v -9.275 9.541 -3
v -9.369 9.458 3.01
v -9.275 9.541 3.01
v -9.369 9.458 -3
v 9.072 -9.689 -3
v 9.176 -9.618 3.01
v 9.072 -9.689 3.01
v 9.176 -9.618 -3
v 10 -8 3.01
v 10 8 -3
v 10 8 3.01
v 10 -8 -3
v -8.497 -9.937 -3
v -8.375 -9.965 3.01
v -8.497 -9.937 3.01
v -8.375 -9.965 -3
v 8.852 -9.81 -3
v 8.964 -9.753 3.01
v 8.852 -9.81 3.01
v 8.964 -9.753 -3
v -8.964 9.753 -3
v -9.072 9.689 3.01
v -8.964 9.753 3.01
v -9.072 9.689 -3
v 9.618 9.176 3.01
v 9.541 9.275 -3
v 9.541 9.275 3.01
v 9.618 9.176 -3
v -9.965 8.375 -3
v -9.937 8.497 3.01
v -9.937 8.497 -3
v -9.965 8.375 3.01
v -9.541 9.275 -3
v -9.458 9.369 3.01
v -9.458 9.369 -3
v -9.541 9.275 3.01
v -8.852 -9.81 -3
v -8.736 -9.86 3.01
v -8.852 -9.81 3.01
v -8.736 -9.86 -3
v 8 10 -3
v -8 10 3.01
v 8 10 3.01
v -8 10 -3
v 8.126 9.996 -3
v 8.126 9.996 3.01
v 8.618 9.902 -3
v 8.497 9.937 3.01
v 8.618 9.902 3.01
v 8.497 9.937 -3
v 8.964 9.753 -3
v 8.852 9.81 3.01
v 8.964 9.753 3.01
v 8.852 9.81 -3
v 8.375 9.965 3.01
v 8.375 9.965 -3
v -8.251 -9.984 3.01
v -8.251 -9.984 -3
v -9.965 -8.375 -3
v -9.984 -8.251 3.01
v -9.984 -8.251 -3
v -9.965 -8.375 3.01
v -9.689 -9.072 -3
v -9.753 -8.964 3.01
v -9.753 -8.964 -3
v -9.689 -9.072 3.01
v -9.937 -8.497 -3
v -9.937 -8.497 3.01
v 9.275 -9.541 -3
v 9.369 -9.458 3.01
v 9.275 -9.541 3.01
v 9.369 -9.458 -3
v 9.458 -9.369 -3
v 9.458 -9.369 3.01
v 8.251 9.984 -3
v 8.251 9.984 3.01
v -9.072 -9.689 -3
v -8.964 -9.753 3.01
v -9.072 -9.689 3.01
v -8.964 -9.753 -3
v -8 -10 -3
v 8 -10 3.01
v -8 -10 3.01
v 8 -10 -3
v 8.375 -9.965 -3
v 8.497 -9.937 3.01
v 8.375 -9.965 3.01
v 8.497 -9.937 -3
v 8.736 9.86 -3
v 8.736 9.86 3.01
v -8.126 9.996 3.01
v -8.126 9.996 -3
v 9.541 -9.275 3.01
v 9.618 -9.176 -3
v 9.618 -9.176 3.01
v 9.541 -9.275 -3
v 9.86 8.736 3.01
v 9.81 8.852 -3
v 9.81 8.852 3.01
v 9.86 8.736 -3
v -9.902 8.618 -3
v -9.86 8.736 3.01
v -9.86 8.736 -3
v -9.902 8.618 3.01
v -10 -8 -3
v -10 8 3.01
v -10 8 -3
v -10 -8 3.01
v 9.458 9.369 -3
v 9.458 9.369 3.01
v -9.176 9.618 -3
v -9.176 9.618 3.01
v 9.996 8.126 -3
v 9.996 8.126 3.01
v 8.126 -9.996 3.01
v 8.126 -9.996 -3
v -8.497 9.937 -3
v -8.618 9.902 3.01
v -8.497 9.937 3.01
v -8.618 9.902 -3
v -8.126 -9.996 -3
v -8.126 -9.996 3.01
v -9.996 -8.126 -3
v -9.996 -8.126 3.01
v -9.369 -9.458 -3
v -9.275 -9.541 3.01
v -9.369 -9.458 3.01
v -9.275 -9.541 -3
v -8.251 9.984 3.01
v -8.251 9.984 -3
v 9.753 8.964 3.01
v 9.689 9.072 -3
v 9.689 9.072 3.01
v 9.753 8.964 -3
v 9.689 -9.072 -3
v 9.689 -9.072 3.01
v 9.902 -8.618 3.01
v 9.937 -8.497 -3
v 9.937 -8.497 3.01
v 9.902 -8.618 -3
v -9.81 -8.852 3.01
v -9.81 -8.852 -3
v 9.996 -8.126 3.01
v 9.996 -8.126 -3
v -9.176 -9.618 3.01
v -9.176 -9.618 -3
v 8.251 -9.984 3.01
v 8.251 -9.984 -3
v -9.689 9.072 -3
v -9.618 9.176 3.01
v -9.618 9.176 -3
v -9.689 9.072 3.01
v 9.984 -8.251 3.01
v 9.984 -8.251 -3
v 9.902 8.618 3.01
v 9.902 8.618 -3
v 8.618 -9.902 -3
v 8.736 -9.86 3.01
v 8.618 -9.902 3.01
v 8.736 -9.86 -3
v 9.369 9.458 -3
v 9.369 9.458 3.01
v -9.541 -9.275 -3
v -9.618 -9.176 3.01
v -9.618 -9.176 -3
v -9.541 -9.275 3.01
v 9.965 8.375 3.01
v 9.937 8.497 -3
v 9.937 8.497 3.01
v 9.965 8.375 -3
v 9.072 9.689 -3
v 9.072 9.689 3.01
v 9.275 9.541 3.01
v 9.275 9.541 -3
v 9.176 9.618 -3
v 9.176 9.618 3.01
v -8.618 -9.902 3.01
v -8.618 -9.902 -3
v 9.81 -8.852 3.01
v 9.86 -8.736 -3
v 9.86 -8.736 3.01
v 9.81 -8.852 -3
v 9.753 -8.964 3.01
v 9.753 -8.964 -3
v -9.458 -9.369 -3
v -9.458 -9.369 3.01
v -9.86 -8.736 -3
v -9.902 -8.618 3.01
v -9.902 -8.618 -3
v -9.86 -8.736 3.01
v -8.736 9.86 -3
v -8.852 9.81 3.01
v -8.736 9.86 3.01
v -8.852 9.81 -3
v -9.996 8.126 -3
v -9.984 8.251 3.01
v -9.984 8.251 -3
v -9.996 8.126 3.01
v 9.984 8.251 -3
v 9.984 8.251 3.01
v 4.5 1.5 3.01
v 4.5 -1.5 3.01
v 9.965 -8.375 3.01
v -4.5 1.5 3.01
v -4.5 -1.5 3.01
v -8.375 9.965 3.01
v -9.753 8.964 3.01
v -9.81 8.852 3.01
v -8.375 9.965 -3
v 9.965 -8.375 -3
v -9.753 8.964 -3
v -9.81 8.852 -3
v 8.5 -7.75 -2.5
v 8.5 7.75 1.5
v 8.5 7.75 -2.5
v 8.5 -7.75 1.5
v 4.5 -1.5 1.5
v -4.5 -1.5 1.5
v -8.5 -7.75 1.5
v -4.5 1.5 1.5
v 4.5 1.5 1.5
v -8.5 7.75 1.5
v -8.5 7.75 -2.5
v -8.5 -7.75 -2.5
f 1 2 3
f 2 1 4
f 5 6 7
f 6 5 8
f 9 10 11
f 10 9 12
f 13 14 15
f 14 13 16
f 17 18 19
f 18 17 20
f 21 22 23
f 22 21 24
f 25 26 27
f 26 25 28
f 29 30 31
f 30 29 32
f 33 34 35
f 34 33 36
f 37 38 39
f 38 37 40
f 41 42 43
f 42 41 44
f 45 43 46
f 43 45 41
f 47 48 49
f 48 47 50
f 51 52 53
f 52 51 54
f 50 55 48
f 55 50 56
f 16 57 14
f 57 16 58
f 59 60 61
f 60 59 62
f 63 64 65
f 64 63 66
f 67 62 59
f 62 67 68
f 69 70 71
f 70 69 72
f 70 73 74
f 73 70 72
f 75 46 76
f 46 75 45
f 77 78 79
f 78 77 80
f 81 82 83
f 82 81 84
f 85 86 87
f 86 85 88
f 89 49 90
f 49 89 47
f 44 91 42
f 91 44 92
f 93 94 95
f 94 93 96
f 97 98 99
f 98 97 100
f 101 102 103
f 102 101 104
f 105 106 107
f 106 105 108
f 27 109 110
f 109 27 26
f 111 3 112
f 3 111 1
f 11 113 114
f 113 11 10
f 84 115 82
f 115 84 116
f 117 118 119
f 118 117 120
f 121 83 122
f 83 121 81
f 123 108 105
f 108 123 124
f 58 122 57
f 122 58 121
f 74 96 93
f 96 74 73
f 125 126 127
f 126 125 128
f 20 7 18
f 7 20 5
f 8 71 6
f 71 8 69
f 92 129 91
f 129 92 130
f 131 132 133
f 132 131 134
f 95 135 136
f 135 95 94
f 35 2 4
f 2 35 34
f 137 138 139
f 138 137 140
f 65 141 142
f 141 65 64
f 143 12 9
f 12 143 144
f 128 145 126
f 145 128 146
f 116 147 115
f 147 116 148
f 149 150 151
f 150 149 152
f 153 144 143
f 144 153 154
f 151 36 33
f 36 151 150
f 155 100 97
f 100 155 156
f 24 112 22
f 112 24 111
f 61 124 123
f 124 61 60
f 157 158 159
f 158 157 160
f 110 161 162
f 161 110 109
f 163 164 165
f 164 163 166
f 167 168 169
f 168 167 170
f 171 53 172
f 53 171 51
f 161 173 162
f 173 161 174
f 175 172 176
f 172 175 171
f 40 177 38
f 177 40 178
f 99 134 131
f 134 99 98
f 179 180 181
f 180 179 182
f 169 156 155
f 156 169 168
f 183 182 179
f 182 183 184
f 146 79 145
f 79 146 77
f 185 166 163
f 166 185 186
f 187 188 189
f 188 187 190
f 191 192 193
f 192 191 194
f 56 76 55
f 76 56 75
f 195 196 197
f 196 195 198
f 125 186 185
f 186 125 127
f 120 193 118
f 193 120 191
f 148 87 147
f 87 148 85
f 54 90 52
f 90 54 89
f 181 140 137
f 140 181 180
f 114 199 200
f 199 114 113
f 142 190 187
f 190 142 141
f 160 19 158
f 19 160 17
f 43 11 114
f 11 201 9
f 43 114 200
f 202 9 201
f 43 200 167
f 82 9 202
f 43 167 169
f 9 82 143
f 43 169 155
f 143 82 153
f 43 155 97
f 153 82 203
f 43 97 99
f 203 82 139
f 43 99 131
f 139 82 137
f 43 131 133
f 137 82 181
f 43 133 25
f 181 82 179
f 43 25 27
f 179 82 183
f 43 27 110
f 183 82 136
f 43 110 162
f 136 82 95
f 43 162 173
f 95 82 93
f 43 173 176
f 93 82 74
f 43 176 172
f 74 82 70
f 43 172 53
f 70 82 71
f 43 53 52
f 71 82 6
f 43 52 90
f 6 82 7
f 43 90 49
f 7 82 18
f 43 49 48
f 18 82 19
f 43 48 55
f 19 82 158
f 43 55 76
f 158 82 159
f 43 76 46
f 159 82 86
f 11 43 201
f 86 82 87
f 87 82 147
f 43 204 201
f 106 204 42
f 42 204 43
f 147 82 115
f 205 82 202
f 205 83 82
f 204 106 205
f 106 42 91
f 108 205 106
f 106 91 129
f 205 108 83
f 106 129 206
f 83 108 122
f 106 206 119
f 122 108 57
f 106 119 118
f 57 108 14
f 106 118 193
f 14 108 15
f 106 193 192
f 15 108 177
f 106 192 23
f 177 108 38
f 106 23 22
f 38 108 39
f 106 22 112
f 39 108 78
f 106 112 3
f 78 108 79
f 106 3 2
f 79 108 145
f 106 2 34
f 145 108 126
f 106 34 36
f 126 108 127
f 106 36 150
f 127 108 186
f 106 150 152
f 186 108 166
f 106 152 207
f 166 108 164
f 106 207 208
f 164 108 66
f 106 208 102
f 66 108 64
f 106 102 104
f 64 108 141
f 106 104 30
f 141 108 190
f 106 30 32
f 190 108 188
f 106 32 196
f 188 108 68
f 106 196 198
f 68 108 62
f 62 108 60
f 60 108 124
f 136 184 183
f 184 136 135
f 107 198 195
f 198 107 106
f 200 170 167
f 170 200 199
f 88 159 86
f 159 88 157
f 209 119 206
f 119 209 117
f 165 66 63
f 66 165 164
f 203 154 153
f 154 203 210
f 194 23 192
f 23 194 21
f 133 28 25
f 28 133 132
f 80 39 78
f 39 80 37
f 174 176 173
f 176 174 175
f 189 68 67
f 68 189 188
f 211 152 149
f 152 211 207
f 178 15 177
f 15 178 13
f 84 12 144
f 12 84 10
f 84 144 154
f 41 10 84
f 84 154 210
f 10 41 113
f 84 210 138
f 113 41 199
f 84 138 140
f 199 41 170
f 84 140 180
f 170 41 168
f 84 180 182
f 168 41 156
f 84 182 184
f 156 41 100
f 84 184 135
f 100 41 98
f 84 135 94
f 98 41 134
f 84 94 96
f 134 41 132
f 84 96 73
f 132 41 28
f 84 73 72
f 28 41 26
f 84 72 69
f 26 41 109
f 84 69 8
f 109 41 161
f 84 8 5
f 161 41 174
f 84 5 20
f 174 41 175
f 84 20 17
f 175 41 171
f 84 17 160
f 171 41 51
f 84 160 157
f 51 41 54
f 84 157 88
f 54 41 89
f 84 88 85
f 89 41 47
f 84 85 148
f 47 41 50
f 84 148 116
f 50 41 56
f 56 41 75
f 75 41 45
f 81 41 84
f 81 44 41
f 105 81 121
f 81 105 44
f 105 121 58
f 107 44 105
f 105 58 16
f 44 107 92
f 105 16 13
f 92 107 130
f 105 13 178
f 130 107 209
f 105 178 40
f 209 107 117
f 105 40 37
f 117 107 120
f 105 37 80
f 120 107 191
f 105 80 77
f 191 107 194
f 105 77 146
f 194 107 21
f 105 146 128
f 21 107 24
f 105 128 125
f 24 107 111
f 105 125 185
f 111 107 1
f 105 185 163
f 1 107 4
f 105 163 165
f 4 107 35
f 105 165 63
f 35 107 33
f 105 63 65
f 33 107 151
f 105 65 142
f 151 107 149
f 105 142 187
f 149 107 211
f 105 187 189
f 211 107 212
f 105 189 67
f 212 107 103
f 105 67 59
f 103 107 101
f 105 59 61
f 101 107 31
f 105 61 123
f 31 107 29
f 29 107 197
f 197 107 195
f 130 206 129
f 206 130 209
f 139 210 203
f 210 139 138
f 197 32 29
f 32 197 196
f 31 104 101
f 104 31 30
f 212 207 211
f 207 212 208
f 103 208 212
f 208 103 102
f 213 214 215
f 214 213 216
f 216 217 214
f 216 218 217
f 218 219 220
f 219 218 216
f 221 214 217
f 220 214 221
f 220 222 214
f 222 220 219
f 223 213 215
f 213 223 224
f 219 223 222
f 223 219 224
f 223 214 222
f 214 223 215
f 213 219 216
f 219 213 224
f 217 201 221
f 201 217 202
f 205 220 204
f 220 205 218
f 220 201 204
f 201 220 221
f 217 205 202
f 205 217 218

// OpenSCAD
difference() {
	minkowski() {
		cube([16, 16, 6], center=true);
		cylinder(r=2, h=0.01, $fn=100);
	}
	translate([0, 0, -0.5])
		cube([17, 15.5, 4], center=true);
	translate([0, 0, 2])
		cube([9, 3, 5], center=true);
}
